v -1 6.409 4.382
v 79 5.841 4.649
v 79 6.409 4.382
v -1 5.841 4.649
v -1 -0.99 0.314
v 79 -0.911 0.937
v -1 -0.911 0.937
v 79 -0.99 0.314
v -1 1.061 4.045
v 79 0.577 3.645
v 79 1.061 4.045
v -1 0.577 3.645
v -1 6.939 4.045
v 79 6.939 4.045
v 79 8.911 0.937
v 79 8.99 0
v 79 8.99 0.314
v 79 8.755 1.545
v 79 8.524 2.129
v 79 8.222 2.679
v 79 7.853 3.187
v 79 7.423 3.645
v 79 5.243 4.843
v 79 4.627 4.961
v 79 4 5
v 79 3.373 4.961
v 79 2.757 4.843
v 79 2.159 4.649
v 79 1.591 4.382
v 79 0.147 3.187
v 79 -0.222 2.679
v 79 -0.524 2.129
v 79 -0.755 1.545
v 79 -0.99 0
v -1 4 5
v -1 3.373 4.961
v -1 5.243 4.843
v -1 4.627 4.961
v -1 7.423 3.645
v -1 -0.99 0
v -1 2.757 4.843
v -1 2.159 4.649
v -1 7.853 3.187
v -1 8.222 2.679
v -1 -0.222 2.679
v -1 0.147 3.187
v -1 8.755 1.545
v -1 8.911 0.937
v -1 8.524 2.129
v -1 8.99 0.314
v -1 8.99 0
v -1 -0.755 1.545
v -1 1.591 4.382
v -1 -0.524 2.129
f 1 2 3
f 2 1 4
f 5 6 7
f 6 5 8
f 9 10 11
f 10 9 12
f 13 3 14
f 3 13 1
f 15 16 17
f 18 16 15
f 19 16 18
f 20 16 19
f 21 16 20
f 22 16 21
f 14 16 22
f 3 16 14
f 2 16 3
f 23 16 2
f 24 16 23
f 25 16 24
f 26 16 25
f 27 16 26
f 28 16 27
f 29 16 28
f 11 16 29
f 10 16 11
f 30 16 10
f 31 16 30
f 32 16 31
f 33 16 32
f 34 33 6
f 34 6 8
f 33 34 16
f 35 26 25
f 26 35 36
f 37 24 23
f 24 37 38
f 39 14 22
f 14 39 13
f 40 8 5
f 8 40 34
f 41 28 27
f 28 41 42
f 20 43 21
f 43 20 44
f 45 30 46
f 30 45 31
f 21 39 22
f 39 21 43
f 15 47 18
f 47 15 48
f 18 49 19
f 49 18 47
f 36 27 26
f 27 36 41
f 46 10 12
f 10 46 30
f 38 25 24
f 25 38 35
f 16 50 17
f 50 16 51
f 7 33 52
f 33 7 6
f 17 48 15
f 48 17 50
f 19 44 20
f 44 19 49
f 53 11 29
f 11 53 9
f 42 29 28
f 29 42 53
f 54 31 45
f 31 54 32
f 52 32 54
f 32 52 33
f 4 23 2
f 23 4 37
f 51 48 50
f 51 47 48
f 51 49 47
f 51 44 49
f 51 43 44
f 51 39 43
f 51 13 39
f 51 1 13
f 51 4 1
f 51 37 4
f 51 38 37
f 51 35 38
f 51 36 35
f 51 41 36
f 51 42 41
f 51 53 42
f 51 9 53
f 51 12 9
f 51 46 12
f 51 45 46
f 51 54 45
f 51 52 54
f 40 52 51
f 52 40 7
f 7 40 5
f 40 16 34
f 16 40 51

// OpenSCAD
difference() {
	translate([-1, 4, 0]) rotate([0,90,0]) cylinder(h=80,r=5,$fn=50);
	linear_extrude(5) import ("name.dxf");
	translate([-2,-1,-5]) cube([93,10,5]);
}
